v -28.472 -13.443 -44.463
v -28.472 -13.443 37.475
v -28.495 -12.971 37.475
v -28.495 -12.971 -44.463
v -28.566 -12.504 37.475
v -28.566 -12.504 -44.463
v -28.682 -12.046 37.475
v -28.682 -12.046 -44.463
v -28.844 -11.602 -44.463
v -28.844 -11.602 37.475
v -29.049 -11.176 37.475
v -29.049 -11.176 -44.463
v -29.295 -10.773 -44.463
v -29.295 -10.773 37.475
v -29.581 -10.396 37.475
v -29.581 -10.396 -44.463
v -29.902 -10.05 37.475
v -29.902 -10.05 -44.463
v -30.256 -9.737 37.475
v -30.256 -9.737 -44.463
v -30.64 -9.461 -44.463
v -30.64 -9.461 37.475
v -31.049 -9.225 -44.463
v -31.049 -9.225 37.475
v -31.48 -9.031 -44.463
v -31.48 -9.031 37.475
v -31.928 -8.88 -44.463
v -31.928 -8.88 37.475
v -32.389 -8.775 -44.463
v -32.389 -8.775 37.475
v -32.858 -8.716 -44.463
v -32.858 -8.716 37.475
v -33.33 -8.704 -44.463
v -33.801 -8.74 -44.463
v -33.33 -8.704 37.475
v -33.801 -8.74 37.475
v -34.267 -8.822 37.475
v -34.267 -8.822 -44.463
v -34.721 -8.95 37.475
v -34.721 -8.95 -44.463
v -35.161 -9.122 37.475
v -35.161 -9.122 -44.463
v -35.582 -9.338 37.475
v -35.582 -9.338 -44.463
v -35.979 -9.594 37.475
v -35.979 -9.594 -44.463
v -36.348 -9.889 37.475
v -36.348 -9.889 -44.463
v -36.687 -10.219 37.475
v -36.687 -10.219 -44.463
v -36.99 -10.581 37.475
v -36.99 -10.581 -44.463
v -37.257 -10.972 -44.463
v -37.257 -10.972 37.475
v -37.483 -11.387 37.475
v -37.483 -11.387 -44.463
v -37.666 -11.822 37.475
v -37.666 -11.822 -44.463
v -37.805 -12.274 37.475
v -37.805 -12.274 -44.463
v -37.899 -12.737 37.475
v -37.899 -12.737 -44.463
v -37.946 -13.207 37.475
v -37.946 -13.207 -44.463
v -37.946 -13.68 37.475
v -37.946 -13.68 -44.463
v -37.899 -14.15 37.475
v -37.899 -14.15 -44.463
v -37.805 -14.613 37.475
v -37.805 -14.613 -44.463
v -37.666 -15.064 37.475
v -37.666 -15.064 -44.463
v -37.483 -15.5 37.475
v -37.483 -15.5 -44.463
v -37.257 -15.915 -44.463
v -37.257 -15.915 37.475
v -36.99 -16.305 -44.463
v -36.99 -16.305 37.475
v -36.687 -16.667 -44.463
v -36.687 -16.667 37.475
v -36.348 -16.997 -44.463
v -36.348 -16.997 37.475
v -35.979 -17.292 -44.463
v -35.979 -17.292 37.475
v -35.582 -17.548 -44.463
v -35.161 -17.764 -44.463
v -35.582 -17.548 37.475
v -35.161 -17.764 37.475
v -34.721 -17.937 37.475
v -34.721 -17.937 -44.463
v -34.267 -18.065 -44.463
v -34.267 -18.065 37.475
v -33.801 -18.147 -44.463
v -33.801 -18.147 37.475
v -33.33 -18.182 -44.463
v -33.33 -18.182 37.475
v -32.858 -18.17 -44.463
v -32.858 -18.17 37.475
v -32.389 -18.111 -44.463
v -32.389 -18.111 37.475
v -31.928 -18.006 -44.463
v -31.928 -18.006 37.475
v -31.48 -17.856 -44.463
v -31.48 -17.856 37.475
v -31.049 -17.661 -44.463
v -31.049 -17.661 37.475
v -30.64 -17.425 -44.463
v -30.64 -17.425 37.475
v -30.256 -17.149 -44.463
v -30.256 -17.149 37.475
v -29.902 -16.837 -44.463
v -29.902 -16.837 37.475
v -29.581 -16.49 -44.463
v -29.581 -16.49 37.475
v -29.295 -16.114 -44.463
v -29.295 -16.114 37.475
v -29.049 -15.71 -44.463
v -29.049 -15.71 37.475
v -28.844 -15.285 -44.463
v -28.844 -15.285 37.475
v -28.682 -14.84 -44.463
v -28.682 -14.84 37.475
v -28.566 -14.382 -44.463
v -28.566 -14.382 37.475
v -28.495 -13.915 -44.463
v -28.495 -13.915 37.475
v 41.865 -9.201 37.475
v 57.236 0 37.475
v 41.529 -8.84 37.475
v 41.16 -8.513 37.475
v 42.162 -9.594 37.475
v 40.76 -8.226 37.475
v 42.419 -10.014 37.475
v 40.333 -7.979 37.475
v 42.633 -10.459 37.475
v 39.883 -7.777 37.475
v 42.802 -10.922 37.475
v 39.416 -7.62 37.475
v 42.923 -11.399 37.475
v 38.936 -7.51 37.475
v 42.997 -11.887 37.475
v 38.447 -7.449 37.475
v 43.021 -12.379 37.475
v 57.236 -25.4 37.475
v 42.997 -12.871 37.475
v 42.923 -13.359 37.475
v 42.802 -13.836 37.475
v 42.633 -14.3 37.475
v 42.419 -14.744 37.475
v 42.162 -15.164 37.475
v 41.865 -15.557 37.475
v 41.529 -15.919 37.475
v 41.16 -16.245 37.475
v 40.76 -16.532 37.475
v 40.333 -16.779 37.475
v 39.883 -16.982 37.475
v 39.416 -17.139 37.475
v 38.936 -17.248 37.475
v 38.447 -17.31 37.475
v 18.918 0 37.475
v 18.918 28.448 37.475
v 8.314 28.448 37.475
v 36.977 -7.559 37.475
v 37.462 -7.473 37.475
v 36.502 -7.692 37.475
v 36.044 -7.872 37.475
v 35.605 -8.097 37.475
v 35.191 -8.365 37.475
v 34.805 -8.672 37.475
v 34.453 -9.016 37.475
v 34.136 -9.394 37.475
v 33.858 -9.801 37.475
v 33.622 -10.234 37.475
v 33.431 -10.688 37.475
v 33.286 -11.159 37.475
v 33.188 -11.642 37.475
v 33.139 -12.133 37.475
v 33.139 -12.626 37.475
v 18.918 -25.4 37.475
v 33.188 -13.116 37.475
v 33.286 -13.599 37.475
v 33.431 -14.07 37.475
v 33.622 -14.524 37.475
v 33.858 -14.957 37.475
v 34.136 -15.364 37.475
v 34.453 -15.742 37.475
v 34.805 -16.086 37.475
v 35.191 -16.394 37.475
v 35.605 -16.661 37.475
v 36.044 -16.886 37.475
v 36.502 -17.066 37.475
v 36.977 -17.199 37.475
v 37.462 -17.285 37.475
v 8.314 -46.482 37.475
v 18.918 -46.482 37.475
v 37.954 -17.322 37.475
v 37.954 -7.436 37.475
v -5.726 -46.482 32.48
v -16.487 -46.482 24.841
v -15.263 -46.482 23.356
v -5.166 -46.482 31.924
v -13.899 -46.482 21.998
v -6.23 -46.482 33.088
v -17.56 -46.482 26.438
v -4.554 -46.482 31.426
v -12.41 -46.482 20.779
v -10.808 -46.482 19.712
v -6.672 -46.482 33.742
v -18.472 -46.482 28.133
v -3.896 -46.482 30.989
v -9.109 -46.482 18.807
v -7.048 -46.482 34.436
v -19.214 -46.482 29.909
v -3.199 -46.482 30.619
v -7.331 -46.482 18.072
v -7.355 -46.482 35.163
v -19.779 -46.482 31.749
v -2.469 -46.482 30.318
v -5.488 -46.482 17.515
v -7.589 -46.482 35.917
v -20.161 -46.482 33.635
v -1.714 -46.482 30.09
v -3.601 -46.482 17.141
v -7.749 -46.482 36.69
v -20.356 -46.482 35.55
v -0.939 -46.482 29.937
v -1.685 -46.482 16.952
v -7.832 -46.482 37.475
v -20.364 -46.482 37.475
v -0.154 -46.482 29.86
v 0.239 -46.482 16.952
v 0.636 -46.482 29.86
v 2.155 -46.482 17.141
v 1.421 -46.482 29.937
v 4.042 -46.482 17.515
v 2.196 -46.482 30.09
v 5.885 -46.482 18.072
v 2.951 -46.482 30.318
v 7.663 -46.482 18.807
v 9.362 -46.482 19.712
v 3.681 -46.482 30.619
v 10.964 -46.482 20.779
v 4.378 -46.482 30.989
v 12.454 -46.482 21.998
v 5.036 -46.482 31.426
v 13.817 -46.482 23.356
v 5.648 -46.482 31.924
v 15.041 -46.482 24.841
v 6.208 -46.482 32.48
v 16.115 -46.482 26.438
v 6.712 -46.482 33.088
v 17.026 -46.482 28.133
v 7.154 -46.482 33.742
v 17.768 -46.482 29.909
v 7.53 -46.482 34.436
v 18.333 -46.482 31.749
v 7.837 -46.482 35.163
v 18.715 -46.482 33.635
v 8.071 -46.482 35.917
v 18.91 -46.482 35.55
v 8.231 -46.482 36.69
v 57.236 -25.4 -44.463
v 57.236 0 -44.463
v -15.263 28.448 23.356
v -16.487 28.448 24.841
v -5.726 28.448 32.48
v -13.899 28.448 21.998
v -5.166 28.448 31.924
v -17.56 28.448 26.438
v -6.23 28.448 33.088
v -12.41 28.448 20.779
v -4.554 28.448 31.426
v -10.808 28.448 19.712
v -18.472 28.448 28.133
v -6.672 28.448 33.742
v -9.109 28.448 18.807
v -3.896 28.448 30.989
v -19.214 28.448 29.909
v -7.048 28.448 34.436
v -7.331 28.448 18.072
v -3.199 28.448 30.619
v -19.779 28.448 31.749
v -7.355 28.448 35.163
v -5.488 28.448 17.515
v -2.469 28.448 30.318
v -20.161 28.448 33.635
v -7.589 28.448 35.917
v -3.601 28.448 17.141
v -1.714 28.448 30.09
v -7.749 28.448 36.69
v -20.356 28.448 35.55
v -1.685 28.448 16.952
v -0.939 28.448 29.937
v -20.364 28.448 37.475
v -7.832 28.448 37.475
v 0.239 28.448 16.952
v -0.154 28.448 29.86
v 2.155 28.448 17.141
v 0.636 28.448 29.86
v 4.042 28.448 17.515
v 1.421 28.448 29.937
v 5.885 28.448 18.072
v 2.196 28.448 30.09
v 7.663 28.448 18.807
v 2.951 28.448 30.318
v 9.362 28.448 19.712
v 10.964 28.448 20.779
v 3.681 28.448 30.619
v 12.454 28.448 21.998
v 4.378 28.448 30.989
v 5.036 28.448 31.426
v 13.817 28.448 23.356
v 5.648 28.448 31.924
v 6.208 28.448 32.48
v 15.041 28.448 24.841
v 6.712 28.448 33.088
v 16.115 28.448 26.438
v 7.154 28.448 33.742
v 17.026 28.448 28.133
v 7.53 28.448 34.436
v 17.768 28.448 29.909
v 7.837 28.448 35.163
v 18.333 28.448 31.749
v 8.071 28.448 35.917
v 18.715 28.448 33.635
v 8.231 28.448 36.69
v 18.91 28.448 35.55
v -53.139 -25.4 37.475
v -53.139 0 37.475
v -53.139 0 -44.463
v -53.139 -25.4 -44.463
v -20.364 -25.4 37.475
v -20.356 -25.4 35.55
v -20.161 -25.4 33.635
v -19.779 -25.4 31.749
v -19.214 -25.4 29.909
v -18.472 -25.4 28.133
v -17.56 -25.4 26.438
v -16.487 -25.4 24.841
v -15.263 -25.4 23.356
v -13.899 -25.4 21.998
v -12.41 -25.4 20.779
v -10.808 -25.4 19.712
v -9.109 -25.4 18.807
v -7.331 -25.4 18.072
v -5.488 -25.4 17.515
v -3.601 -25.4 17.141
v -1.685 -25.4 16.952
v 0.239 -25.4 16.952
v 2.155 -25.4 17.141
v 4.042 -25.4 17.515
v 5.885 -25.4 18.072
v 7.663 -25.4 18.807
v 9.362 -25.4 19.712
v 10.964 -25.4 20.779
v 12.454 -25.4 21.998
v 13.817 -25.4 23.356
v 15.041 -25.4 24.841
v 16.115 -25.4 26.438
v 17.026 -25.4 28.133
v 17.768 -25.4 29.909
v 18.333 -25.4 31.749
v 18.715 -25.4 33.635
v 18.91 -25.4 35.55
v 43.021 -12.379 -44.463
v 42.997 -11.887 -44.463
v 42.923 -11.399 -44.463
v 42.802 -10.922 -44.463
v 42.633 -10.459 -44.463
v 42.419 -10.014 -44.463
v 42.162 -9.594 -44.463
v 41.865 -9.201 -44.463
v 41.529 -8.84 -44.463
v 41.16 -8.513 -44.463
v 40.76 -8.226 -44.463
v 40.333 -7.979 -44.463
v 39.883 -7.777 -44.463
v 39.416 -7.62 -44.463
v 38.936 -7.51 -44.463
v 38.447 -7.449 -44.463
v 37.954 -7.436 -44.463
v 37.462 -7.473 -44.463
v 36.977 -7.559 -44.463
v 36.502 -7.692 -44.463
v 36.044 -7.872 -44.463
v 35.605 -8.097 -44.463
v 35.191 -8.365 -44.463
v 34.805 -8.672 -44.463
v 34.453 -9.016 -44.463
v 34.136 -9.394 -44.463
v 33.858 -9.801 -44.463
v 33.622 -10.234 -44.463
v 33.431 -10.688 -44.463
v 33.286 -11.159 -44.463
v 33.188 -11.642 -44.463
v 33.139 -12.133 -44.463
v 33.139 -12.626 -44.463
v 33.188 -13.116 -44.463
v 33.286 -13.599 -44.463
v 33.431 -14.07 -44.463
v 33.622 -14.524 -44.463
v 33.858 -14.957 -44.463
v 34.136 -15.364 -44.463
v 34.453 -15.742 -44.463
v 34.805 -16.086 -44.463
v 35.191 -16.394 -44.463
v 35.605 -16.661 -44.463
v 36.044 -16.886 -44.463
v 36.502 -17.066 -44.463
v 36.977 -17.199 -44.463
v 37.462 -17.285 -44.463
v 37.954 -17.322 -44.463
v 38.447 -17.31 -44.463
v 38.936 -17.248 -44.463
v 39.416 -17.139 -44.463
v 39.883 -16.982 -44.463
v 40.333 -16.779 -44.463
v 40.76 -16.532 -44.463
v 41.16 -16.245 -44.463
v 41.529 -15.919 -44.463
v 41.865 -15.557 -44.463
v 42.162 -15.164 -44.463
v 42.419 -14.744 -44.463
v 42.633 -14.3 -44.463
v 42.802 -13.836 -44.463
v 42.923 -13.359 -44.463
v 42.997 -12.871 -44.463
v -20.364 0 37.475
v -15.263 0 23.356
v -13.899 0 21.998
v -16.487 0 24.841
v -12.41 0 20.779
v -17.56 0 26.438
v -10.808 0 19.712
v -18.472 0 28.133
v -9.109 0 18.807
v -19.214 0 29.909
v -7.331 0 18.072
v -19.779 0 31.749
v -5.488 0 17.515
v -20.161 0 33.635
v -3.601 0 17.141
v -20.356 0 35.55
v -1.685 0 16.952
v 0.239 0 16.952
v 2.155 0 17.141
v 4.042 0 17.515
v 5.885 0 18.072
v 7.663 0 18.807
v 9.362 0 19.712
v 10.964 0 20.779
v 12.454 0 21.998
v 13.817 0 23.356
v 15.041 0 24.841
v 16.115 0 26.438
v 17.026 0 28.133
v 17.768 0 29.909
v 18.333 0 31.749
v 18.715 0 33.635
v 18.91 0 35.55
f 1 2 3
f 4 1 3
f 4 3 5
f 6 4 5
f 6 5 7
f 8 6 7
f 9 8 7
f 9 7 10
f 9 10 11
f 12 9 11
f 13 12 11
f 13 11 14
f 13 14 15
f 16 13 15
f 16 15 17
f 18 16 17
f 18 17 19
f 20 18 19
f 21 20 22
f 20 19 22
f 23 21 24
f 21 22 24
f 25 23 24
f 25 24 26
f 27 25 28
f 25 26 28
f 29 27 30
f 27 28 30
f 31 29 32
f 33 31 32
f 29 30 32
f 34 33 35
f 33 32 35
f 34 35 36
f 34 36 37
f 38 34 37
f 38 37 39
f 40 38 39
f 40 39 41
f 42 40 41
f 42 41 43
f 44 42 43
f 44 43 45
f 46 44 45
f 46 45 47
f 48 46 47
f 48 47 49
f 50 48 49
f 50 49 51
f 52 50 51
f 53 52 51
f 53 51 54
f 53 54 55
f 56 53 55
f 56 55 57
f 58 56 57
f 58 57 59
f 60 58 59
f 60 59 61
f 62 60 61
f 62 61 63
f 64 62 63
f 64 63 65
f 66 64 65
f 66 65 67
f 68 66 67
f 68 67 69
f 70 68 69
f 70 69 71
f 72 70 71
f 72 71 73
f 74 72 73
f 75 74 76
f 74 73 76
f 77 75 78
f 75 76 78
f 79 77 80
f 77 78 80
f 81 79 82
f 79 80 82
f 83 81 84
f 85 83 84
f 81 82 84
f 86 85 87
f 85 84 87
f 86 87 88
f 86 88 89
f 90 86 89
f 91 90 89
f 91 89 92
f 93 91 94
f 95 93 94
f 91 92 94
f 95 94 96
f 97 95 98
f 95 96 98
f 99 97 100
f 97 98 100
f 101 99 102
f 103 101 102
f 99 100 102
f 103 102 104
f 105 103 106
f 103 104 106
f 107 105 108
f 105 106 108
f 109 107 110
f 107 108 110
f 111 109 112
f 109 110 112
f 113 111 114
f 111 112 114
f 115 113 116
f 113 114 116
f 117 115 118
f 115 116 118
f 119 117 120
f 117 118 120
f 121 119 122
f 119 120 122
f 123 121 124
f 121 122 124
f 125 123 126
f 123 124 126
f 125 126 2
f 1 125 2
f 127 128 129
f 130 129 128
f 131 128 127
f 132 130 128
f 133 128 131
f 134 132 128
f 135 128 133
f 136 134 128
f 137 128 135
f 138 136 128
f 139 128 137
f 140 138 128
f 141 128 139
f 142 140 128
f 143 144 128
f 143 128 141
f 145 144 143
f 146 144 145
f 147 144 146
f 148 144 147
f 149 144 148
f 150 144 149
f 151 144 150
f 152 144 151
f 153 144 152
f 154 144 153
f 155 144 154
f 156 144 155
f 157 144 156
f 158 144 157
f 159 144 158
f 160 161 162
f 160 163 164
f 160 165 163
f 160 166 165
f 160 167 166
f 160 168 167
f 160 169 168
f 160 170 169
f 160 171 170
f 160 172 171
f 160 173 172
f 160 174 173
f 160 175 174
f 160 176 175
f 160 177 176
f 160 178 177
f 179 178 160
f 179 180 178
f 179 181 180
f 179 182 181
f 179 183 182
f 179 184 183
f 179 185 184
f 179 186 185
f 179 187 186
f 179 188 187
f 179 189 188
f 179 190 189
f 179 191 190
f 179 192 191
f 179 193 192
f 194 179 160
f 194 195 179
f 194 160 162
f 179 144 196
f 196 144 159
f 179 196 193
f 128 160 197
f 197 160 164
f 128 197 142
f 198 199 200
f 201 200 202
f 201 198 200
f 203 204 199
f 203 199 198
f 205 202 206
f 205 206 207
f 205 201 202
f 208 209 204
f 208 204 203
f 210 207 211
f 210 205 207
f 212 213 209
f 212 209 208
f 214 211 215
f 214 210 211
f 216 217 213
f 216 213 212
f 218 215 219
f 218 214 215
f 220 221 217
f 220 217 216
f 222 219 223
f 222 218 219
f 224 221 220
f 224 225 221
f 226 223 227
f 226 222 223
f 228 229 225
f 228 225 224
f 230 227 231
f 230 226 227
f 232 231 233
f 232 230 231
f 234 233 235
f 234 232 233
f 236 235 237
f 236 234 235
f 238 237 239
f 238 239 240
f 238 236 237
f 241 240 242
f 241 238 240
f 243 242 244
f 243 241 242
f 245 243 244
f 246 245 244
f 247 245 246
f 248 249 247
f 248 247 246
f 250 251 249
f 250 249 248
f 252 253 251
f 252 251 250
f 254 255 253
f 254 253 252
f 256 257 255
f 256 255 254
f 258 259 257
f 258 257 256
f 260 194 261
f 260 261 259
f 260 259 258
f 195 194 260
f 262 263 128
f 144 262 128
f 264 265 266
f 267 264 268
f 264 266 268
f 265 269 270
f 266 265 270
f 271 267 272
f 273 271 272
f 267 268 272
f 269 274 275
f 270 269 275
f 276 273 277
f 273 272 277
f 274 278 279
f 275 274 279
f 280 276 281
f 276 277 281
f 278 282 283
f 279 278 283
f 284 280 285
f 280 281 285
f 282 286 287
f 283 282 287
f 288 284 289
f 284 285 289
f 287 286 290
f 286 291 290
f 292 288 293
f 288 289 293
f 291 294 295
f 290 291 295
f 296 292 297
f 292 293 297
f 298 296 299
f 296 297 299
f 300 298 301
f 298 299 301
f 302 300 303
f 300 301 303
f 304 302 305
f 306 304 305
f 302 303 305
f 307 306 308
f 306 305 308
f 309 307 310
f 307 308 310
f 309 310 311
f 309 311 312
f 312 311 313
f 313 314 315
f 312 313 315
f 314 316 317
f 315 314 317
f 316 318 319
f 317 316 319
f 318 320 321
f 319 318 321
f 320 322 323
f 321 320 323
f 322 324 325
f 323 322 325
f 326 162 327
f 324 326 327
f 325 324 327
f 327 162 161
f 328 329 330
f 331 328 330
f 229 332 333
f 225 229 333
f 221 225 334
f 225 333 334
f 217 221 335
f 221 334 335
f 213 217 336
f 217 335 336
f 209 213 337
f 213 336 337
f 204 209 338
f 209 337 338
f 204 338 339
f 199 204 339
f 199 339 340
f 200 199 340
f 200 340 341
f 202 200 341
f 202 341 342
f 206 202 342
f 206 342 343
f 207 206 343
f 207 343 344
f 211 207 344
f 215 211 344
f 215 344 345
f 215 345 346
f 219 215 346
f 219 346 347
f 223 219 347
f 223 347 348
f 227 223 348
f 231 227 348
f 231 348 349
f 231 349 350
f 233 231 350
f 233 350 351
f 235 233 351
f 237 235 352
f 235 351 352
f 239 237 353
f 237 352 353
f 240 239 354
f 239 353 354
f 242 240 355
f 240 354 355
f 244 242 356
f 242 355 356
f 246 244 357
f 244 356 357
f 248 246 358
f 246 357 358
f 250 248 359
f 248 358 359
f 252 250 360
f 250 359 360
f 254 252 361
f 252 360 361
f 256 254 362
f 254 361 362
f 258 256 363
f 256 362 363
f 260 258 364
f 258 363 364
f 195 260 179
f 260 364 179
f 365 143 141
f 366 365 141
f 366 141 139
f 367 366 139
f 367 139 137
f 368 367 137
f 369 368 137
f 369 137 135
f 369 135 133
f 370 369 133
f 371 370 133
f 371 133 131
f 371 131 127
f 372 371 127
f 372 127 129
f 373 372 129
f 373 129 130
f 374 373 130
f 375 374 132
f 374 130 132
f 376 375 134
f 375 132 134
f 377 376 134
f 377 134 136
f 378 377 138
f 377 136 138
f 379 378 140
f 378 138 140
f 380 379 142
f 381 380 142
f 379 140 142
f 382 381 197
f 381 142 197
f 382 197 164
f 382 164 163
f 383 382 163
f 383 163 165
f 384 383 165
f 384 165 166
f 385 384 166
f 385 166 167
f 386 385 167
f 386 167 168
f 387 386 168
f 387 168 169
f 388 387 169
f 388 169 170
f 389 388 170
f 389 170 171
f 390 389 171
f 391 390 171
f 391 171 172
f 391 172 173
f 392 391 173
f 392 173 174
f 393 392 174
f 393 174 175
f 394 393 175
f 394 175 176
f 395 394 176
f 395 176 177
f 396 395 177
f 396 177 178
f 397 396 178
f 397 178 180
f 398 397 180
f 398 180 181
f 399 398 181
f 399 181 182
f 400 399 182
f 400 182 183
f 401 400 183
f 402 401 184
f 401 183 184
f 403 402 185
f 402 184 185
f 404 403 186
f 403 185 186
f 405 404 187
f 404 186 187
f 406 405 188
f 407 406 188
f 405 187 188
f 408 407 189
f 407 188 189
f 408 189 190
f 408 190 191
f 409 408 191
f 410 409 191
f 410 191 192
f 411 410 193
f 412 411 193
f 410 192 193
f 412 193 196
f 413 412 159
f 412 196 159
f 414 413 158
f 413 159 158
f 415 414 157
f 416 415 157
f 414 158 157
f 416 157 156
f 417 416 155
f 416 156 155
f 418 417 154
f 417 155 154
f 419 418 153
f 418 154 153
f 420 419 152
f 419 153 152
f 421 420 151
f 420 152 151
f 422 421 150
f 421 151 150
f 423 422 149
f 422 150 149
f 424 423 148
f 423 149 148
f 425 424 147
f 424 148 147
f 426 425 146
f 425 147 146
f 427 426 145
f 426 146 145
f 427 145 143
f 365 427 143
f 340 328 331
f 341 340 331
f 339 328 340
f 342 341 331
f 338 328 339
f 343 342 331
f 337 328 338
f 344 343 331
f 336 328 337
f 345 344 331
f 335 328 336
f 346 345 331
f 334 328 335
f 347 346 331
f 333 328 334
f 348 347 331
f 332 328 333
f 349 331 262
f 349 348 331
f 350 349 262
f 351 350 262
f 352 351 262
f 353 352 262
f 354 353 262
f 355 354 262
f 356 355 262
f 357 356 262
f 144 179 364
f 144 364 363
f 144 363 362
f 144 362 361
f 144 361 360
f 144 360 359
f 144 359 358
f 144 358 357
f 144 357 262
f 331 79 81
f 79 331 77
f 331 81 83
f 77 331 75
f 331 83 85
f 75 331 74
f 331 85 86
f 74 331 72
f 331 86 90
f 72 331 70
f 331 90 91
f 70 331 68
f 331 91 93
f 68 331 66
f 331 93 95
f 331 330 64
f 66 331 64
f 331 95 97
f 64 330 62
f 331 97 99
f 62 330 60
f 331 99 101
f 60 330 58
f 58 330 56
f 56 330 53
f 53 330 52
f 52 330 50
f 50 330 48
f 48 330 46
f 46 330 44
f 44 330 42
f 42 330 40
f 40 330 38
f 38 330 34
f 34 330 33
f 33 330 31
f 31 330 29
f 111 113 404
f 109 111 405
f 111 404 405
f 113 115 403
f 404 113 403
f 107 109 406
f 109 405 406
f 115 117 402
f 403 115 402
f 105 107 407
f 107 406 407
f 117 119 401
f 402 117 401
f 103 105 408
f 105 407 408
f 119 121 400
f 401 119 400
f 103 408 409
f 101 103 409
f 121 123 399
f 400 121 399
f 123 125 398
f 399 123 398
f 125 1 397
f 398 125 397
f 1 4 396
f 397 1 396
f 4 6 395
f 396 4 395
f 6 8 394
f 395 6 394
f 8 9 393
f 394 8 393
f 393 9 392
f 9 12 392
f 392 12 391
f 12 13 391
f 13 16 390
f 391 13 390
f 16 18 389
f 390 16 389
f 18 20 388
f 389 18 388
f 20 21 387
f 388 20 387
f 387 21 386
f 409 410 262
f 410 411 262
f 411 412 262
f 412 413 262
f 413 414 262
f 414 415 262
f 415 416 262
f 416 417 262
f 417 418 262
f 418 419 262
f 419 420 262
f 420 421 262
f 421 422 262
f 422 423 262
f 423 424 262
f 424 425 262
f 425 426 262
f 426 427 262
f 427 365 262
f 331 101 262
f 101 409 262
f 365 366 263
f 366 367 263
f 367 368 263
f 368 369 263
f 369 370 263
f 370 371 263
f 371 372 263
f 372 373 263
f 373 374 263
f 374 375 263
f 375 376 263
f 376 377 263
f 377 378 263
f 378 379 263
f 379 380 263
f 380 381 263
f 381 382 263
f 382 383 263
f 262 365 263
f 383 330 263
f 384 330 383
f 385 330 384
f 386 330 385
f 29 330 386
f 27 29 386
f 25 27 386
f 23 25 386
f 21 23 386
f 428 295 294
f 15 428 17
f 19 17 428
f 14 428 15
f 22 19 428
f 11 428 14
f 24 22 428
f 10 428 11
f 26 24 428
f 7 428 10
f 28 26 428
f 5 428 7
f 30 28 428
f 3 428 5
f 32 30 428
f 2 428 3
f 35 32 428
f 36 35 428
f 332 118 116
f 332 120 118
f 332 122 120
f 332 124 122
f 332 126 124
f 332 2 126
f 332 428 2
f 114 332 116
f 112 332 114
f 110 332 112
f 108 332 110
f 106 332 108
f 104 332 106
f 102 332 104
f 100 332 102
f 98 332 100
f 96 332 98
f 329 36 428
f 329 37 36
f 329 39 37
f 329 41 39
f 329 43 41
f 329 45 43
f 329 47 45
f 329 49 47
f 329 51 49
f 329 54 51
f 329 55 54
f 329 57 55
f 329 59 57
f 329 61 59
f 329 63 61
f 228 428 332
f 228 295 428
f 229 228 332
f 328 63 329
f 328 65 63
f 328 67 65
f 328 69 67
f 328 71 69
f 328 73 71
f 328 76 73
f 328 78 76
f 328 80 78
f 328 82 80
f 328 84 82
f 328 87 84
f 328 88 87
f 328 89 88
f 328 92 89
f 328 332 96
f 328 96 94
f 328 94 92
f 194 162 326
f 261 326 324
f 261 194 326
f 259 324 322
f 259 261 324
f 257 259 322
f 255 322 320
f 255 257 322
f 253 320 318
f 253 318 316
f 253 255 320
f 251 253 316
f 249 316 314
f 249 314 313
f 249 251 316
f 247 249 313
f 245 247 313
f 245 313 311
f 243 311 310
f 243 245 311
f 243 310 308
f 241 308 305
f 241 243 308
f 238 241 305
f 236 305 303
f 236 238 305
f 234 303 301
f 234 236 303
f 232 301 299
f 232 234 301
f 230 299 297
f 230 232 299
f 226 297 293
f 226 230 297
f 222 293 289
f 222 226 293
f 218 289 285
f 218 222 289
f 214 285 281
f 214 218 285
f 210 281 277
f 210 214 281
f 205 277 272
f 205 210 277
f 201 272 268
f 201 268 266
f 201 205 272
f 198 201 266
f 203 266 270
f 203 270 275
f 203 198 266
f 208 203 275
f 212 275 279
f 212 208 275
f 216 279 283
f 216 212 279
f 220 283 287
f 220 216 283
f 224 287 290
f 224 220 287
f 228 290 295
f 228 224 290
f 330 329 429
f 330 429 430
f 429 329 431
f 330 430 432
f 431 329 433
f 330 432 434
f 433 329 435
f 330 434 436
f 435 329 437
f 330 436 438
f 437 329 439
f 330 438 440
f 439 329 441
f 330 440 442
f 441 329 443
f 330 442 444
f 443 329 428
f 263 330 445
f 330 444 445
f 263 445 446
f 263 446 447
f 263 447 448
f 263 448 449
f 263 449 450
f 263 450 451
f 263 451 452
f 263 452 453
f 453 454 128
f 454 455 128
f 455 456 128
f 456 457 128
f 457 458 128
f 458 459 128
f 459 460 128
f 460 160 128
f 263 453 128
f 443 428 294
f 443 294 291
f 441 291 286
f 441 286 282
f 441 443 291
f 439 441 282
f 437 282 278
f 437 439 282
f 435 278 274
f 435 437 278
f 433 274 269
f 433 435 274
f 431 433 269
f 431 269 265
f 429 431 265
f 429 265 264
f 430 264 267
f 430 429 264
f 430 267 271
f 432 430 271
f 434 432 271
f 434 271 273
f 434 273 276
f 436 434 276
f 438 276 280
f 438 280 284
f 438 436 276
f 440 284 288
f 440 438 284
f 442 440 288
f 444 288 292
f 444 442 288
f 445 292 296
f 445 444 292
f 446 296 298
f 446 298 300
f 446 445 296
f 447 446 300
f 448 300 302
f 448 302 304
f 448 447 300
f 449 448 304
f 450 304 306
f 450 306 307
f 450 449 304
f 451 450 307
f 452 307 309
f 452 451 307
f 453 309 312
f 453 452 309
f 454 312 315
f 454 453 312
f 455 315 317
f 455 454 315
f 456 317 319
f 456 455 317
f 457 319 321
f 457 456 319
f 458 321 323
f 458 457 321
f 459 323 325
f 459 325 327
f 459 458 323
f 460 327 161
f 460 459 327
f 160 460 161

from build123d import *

# Parameters (mm, degrees)
F1_DEPTH = 25.4
F2_DEPTH = 46.482
F3_DEPTH = 28.448
F4_R     = 4.944342
F5_DEPTH = 146.304
F6_R     = 4.740228
F7_DEPTH = 190.754


with BuildPart() as f1:
    # F0 (on Front) → F1 (new body)
    with BuildSketch(Plane.XZ):
        with BuildLine():
            Line((-20.36399, 37.474565), (-53.139172, 37.474565))
            Line((-53.139172, 37.474565), (-53.139172, -44.463389))
            Line((-53.139172, -44.463389), (57.236072, -44.463389))
            Line((57.236072, -44.463389), (57.236072, 37.474565))
            Line((57.236072, 37.474565), (18.918028, 37.474565))
            ThreePointArc((18.918028, 37.474565), (-0.722981, 16.928844), (-20.36399, 37.474565))
        make_face()
    extrude(amount=F1_DEPTH)

    # F0 (on Front) → F2 (join)
    with BuildSketch(Plane.XZ):
        with BuildLine():
            Line((-7.832305, 37.474565), (-20.36399, 37.474565))
            ThreePointArc((-20.36399, 37.474565), (-0.722981, 16.928844), (18.918028, 37.474565))
            Line((18.918028, 37.474565), (8.314293, 37.474565))
            ThreePointArc((8.314293, 37.474565), (0.240994, 29.850579), (-7.832305, 37.474565))
        make_face()
    extrude(amount=F2_DEPTH)

    # F0 (on Front) → F3 (join)
    with BuildSketch(Plane.XZ):
        with BuildLine():
            Line((-7.832305, 37.474565), (-20.36399, 37.474565))
            ThreePointArc((-20.36399, 37.474565), (-0.722981, 16.928844), (18.918028, 37.474565))
            Line((18.918028, 37.474565), (8.314293, 37.474565))
            ThreePointArc((8.314293, 37.474565), (0.240994, 29.850579), (-7.832305, 37.474565))
        make_face()
    extrude(amount=-F3_DEPTH)

    # F4 (on face) → F5 (cut)
    with BuildSketch(Plane.XY.offset(37.474565)):
        with Locations((38.07705, -12.379073)):
            Circle(F4_R)
    extrude(amount=-F5_DEPTH, mode=Mode.SUBTRACT)

    # F6 (on face) → F7 (cut)
    with BuildSketch(Plane.XY.offset(37.474565)):
        with Locations((-33.211779, -13.443239)):
            Circle(F6_R)
    extrude(amount=-F7_DEPTH, mode=Mode.SUBTRACT)


solid = f1.part
